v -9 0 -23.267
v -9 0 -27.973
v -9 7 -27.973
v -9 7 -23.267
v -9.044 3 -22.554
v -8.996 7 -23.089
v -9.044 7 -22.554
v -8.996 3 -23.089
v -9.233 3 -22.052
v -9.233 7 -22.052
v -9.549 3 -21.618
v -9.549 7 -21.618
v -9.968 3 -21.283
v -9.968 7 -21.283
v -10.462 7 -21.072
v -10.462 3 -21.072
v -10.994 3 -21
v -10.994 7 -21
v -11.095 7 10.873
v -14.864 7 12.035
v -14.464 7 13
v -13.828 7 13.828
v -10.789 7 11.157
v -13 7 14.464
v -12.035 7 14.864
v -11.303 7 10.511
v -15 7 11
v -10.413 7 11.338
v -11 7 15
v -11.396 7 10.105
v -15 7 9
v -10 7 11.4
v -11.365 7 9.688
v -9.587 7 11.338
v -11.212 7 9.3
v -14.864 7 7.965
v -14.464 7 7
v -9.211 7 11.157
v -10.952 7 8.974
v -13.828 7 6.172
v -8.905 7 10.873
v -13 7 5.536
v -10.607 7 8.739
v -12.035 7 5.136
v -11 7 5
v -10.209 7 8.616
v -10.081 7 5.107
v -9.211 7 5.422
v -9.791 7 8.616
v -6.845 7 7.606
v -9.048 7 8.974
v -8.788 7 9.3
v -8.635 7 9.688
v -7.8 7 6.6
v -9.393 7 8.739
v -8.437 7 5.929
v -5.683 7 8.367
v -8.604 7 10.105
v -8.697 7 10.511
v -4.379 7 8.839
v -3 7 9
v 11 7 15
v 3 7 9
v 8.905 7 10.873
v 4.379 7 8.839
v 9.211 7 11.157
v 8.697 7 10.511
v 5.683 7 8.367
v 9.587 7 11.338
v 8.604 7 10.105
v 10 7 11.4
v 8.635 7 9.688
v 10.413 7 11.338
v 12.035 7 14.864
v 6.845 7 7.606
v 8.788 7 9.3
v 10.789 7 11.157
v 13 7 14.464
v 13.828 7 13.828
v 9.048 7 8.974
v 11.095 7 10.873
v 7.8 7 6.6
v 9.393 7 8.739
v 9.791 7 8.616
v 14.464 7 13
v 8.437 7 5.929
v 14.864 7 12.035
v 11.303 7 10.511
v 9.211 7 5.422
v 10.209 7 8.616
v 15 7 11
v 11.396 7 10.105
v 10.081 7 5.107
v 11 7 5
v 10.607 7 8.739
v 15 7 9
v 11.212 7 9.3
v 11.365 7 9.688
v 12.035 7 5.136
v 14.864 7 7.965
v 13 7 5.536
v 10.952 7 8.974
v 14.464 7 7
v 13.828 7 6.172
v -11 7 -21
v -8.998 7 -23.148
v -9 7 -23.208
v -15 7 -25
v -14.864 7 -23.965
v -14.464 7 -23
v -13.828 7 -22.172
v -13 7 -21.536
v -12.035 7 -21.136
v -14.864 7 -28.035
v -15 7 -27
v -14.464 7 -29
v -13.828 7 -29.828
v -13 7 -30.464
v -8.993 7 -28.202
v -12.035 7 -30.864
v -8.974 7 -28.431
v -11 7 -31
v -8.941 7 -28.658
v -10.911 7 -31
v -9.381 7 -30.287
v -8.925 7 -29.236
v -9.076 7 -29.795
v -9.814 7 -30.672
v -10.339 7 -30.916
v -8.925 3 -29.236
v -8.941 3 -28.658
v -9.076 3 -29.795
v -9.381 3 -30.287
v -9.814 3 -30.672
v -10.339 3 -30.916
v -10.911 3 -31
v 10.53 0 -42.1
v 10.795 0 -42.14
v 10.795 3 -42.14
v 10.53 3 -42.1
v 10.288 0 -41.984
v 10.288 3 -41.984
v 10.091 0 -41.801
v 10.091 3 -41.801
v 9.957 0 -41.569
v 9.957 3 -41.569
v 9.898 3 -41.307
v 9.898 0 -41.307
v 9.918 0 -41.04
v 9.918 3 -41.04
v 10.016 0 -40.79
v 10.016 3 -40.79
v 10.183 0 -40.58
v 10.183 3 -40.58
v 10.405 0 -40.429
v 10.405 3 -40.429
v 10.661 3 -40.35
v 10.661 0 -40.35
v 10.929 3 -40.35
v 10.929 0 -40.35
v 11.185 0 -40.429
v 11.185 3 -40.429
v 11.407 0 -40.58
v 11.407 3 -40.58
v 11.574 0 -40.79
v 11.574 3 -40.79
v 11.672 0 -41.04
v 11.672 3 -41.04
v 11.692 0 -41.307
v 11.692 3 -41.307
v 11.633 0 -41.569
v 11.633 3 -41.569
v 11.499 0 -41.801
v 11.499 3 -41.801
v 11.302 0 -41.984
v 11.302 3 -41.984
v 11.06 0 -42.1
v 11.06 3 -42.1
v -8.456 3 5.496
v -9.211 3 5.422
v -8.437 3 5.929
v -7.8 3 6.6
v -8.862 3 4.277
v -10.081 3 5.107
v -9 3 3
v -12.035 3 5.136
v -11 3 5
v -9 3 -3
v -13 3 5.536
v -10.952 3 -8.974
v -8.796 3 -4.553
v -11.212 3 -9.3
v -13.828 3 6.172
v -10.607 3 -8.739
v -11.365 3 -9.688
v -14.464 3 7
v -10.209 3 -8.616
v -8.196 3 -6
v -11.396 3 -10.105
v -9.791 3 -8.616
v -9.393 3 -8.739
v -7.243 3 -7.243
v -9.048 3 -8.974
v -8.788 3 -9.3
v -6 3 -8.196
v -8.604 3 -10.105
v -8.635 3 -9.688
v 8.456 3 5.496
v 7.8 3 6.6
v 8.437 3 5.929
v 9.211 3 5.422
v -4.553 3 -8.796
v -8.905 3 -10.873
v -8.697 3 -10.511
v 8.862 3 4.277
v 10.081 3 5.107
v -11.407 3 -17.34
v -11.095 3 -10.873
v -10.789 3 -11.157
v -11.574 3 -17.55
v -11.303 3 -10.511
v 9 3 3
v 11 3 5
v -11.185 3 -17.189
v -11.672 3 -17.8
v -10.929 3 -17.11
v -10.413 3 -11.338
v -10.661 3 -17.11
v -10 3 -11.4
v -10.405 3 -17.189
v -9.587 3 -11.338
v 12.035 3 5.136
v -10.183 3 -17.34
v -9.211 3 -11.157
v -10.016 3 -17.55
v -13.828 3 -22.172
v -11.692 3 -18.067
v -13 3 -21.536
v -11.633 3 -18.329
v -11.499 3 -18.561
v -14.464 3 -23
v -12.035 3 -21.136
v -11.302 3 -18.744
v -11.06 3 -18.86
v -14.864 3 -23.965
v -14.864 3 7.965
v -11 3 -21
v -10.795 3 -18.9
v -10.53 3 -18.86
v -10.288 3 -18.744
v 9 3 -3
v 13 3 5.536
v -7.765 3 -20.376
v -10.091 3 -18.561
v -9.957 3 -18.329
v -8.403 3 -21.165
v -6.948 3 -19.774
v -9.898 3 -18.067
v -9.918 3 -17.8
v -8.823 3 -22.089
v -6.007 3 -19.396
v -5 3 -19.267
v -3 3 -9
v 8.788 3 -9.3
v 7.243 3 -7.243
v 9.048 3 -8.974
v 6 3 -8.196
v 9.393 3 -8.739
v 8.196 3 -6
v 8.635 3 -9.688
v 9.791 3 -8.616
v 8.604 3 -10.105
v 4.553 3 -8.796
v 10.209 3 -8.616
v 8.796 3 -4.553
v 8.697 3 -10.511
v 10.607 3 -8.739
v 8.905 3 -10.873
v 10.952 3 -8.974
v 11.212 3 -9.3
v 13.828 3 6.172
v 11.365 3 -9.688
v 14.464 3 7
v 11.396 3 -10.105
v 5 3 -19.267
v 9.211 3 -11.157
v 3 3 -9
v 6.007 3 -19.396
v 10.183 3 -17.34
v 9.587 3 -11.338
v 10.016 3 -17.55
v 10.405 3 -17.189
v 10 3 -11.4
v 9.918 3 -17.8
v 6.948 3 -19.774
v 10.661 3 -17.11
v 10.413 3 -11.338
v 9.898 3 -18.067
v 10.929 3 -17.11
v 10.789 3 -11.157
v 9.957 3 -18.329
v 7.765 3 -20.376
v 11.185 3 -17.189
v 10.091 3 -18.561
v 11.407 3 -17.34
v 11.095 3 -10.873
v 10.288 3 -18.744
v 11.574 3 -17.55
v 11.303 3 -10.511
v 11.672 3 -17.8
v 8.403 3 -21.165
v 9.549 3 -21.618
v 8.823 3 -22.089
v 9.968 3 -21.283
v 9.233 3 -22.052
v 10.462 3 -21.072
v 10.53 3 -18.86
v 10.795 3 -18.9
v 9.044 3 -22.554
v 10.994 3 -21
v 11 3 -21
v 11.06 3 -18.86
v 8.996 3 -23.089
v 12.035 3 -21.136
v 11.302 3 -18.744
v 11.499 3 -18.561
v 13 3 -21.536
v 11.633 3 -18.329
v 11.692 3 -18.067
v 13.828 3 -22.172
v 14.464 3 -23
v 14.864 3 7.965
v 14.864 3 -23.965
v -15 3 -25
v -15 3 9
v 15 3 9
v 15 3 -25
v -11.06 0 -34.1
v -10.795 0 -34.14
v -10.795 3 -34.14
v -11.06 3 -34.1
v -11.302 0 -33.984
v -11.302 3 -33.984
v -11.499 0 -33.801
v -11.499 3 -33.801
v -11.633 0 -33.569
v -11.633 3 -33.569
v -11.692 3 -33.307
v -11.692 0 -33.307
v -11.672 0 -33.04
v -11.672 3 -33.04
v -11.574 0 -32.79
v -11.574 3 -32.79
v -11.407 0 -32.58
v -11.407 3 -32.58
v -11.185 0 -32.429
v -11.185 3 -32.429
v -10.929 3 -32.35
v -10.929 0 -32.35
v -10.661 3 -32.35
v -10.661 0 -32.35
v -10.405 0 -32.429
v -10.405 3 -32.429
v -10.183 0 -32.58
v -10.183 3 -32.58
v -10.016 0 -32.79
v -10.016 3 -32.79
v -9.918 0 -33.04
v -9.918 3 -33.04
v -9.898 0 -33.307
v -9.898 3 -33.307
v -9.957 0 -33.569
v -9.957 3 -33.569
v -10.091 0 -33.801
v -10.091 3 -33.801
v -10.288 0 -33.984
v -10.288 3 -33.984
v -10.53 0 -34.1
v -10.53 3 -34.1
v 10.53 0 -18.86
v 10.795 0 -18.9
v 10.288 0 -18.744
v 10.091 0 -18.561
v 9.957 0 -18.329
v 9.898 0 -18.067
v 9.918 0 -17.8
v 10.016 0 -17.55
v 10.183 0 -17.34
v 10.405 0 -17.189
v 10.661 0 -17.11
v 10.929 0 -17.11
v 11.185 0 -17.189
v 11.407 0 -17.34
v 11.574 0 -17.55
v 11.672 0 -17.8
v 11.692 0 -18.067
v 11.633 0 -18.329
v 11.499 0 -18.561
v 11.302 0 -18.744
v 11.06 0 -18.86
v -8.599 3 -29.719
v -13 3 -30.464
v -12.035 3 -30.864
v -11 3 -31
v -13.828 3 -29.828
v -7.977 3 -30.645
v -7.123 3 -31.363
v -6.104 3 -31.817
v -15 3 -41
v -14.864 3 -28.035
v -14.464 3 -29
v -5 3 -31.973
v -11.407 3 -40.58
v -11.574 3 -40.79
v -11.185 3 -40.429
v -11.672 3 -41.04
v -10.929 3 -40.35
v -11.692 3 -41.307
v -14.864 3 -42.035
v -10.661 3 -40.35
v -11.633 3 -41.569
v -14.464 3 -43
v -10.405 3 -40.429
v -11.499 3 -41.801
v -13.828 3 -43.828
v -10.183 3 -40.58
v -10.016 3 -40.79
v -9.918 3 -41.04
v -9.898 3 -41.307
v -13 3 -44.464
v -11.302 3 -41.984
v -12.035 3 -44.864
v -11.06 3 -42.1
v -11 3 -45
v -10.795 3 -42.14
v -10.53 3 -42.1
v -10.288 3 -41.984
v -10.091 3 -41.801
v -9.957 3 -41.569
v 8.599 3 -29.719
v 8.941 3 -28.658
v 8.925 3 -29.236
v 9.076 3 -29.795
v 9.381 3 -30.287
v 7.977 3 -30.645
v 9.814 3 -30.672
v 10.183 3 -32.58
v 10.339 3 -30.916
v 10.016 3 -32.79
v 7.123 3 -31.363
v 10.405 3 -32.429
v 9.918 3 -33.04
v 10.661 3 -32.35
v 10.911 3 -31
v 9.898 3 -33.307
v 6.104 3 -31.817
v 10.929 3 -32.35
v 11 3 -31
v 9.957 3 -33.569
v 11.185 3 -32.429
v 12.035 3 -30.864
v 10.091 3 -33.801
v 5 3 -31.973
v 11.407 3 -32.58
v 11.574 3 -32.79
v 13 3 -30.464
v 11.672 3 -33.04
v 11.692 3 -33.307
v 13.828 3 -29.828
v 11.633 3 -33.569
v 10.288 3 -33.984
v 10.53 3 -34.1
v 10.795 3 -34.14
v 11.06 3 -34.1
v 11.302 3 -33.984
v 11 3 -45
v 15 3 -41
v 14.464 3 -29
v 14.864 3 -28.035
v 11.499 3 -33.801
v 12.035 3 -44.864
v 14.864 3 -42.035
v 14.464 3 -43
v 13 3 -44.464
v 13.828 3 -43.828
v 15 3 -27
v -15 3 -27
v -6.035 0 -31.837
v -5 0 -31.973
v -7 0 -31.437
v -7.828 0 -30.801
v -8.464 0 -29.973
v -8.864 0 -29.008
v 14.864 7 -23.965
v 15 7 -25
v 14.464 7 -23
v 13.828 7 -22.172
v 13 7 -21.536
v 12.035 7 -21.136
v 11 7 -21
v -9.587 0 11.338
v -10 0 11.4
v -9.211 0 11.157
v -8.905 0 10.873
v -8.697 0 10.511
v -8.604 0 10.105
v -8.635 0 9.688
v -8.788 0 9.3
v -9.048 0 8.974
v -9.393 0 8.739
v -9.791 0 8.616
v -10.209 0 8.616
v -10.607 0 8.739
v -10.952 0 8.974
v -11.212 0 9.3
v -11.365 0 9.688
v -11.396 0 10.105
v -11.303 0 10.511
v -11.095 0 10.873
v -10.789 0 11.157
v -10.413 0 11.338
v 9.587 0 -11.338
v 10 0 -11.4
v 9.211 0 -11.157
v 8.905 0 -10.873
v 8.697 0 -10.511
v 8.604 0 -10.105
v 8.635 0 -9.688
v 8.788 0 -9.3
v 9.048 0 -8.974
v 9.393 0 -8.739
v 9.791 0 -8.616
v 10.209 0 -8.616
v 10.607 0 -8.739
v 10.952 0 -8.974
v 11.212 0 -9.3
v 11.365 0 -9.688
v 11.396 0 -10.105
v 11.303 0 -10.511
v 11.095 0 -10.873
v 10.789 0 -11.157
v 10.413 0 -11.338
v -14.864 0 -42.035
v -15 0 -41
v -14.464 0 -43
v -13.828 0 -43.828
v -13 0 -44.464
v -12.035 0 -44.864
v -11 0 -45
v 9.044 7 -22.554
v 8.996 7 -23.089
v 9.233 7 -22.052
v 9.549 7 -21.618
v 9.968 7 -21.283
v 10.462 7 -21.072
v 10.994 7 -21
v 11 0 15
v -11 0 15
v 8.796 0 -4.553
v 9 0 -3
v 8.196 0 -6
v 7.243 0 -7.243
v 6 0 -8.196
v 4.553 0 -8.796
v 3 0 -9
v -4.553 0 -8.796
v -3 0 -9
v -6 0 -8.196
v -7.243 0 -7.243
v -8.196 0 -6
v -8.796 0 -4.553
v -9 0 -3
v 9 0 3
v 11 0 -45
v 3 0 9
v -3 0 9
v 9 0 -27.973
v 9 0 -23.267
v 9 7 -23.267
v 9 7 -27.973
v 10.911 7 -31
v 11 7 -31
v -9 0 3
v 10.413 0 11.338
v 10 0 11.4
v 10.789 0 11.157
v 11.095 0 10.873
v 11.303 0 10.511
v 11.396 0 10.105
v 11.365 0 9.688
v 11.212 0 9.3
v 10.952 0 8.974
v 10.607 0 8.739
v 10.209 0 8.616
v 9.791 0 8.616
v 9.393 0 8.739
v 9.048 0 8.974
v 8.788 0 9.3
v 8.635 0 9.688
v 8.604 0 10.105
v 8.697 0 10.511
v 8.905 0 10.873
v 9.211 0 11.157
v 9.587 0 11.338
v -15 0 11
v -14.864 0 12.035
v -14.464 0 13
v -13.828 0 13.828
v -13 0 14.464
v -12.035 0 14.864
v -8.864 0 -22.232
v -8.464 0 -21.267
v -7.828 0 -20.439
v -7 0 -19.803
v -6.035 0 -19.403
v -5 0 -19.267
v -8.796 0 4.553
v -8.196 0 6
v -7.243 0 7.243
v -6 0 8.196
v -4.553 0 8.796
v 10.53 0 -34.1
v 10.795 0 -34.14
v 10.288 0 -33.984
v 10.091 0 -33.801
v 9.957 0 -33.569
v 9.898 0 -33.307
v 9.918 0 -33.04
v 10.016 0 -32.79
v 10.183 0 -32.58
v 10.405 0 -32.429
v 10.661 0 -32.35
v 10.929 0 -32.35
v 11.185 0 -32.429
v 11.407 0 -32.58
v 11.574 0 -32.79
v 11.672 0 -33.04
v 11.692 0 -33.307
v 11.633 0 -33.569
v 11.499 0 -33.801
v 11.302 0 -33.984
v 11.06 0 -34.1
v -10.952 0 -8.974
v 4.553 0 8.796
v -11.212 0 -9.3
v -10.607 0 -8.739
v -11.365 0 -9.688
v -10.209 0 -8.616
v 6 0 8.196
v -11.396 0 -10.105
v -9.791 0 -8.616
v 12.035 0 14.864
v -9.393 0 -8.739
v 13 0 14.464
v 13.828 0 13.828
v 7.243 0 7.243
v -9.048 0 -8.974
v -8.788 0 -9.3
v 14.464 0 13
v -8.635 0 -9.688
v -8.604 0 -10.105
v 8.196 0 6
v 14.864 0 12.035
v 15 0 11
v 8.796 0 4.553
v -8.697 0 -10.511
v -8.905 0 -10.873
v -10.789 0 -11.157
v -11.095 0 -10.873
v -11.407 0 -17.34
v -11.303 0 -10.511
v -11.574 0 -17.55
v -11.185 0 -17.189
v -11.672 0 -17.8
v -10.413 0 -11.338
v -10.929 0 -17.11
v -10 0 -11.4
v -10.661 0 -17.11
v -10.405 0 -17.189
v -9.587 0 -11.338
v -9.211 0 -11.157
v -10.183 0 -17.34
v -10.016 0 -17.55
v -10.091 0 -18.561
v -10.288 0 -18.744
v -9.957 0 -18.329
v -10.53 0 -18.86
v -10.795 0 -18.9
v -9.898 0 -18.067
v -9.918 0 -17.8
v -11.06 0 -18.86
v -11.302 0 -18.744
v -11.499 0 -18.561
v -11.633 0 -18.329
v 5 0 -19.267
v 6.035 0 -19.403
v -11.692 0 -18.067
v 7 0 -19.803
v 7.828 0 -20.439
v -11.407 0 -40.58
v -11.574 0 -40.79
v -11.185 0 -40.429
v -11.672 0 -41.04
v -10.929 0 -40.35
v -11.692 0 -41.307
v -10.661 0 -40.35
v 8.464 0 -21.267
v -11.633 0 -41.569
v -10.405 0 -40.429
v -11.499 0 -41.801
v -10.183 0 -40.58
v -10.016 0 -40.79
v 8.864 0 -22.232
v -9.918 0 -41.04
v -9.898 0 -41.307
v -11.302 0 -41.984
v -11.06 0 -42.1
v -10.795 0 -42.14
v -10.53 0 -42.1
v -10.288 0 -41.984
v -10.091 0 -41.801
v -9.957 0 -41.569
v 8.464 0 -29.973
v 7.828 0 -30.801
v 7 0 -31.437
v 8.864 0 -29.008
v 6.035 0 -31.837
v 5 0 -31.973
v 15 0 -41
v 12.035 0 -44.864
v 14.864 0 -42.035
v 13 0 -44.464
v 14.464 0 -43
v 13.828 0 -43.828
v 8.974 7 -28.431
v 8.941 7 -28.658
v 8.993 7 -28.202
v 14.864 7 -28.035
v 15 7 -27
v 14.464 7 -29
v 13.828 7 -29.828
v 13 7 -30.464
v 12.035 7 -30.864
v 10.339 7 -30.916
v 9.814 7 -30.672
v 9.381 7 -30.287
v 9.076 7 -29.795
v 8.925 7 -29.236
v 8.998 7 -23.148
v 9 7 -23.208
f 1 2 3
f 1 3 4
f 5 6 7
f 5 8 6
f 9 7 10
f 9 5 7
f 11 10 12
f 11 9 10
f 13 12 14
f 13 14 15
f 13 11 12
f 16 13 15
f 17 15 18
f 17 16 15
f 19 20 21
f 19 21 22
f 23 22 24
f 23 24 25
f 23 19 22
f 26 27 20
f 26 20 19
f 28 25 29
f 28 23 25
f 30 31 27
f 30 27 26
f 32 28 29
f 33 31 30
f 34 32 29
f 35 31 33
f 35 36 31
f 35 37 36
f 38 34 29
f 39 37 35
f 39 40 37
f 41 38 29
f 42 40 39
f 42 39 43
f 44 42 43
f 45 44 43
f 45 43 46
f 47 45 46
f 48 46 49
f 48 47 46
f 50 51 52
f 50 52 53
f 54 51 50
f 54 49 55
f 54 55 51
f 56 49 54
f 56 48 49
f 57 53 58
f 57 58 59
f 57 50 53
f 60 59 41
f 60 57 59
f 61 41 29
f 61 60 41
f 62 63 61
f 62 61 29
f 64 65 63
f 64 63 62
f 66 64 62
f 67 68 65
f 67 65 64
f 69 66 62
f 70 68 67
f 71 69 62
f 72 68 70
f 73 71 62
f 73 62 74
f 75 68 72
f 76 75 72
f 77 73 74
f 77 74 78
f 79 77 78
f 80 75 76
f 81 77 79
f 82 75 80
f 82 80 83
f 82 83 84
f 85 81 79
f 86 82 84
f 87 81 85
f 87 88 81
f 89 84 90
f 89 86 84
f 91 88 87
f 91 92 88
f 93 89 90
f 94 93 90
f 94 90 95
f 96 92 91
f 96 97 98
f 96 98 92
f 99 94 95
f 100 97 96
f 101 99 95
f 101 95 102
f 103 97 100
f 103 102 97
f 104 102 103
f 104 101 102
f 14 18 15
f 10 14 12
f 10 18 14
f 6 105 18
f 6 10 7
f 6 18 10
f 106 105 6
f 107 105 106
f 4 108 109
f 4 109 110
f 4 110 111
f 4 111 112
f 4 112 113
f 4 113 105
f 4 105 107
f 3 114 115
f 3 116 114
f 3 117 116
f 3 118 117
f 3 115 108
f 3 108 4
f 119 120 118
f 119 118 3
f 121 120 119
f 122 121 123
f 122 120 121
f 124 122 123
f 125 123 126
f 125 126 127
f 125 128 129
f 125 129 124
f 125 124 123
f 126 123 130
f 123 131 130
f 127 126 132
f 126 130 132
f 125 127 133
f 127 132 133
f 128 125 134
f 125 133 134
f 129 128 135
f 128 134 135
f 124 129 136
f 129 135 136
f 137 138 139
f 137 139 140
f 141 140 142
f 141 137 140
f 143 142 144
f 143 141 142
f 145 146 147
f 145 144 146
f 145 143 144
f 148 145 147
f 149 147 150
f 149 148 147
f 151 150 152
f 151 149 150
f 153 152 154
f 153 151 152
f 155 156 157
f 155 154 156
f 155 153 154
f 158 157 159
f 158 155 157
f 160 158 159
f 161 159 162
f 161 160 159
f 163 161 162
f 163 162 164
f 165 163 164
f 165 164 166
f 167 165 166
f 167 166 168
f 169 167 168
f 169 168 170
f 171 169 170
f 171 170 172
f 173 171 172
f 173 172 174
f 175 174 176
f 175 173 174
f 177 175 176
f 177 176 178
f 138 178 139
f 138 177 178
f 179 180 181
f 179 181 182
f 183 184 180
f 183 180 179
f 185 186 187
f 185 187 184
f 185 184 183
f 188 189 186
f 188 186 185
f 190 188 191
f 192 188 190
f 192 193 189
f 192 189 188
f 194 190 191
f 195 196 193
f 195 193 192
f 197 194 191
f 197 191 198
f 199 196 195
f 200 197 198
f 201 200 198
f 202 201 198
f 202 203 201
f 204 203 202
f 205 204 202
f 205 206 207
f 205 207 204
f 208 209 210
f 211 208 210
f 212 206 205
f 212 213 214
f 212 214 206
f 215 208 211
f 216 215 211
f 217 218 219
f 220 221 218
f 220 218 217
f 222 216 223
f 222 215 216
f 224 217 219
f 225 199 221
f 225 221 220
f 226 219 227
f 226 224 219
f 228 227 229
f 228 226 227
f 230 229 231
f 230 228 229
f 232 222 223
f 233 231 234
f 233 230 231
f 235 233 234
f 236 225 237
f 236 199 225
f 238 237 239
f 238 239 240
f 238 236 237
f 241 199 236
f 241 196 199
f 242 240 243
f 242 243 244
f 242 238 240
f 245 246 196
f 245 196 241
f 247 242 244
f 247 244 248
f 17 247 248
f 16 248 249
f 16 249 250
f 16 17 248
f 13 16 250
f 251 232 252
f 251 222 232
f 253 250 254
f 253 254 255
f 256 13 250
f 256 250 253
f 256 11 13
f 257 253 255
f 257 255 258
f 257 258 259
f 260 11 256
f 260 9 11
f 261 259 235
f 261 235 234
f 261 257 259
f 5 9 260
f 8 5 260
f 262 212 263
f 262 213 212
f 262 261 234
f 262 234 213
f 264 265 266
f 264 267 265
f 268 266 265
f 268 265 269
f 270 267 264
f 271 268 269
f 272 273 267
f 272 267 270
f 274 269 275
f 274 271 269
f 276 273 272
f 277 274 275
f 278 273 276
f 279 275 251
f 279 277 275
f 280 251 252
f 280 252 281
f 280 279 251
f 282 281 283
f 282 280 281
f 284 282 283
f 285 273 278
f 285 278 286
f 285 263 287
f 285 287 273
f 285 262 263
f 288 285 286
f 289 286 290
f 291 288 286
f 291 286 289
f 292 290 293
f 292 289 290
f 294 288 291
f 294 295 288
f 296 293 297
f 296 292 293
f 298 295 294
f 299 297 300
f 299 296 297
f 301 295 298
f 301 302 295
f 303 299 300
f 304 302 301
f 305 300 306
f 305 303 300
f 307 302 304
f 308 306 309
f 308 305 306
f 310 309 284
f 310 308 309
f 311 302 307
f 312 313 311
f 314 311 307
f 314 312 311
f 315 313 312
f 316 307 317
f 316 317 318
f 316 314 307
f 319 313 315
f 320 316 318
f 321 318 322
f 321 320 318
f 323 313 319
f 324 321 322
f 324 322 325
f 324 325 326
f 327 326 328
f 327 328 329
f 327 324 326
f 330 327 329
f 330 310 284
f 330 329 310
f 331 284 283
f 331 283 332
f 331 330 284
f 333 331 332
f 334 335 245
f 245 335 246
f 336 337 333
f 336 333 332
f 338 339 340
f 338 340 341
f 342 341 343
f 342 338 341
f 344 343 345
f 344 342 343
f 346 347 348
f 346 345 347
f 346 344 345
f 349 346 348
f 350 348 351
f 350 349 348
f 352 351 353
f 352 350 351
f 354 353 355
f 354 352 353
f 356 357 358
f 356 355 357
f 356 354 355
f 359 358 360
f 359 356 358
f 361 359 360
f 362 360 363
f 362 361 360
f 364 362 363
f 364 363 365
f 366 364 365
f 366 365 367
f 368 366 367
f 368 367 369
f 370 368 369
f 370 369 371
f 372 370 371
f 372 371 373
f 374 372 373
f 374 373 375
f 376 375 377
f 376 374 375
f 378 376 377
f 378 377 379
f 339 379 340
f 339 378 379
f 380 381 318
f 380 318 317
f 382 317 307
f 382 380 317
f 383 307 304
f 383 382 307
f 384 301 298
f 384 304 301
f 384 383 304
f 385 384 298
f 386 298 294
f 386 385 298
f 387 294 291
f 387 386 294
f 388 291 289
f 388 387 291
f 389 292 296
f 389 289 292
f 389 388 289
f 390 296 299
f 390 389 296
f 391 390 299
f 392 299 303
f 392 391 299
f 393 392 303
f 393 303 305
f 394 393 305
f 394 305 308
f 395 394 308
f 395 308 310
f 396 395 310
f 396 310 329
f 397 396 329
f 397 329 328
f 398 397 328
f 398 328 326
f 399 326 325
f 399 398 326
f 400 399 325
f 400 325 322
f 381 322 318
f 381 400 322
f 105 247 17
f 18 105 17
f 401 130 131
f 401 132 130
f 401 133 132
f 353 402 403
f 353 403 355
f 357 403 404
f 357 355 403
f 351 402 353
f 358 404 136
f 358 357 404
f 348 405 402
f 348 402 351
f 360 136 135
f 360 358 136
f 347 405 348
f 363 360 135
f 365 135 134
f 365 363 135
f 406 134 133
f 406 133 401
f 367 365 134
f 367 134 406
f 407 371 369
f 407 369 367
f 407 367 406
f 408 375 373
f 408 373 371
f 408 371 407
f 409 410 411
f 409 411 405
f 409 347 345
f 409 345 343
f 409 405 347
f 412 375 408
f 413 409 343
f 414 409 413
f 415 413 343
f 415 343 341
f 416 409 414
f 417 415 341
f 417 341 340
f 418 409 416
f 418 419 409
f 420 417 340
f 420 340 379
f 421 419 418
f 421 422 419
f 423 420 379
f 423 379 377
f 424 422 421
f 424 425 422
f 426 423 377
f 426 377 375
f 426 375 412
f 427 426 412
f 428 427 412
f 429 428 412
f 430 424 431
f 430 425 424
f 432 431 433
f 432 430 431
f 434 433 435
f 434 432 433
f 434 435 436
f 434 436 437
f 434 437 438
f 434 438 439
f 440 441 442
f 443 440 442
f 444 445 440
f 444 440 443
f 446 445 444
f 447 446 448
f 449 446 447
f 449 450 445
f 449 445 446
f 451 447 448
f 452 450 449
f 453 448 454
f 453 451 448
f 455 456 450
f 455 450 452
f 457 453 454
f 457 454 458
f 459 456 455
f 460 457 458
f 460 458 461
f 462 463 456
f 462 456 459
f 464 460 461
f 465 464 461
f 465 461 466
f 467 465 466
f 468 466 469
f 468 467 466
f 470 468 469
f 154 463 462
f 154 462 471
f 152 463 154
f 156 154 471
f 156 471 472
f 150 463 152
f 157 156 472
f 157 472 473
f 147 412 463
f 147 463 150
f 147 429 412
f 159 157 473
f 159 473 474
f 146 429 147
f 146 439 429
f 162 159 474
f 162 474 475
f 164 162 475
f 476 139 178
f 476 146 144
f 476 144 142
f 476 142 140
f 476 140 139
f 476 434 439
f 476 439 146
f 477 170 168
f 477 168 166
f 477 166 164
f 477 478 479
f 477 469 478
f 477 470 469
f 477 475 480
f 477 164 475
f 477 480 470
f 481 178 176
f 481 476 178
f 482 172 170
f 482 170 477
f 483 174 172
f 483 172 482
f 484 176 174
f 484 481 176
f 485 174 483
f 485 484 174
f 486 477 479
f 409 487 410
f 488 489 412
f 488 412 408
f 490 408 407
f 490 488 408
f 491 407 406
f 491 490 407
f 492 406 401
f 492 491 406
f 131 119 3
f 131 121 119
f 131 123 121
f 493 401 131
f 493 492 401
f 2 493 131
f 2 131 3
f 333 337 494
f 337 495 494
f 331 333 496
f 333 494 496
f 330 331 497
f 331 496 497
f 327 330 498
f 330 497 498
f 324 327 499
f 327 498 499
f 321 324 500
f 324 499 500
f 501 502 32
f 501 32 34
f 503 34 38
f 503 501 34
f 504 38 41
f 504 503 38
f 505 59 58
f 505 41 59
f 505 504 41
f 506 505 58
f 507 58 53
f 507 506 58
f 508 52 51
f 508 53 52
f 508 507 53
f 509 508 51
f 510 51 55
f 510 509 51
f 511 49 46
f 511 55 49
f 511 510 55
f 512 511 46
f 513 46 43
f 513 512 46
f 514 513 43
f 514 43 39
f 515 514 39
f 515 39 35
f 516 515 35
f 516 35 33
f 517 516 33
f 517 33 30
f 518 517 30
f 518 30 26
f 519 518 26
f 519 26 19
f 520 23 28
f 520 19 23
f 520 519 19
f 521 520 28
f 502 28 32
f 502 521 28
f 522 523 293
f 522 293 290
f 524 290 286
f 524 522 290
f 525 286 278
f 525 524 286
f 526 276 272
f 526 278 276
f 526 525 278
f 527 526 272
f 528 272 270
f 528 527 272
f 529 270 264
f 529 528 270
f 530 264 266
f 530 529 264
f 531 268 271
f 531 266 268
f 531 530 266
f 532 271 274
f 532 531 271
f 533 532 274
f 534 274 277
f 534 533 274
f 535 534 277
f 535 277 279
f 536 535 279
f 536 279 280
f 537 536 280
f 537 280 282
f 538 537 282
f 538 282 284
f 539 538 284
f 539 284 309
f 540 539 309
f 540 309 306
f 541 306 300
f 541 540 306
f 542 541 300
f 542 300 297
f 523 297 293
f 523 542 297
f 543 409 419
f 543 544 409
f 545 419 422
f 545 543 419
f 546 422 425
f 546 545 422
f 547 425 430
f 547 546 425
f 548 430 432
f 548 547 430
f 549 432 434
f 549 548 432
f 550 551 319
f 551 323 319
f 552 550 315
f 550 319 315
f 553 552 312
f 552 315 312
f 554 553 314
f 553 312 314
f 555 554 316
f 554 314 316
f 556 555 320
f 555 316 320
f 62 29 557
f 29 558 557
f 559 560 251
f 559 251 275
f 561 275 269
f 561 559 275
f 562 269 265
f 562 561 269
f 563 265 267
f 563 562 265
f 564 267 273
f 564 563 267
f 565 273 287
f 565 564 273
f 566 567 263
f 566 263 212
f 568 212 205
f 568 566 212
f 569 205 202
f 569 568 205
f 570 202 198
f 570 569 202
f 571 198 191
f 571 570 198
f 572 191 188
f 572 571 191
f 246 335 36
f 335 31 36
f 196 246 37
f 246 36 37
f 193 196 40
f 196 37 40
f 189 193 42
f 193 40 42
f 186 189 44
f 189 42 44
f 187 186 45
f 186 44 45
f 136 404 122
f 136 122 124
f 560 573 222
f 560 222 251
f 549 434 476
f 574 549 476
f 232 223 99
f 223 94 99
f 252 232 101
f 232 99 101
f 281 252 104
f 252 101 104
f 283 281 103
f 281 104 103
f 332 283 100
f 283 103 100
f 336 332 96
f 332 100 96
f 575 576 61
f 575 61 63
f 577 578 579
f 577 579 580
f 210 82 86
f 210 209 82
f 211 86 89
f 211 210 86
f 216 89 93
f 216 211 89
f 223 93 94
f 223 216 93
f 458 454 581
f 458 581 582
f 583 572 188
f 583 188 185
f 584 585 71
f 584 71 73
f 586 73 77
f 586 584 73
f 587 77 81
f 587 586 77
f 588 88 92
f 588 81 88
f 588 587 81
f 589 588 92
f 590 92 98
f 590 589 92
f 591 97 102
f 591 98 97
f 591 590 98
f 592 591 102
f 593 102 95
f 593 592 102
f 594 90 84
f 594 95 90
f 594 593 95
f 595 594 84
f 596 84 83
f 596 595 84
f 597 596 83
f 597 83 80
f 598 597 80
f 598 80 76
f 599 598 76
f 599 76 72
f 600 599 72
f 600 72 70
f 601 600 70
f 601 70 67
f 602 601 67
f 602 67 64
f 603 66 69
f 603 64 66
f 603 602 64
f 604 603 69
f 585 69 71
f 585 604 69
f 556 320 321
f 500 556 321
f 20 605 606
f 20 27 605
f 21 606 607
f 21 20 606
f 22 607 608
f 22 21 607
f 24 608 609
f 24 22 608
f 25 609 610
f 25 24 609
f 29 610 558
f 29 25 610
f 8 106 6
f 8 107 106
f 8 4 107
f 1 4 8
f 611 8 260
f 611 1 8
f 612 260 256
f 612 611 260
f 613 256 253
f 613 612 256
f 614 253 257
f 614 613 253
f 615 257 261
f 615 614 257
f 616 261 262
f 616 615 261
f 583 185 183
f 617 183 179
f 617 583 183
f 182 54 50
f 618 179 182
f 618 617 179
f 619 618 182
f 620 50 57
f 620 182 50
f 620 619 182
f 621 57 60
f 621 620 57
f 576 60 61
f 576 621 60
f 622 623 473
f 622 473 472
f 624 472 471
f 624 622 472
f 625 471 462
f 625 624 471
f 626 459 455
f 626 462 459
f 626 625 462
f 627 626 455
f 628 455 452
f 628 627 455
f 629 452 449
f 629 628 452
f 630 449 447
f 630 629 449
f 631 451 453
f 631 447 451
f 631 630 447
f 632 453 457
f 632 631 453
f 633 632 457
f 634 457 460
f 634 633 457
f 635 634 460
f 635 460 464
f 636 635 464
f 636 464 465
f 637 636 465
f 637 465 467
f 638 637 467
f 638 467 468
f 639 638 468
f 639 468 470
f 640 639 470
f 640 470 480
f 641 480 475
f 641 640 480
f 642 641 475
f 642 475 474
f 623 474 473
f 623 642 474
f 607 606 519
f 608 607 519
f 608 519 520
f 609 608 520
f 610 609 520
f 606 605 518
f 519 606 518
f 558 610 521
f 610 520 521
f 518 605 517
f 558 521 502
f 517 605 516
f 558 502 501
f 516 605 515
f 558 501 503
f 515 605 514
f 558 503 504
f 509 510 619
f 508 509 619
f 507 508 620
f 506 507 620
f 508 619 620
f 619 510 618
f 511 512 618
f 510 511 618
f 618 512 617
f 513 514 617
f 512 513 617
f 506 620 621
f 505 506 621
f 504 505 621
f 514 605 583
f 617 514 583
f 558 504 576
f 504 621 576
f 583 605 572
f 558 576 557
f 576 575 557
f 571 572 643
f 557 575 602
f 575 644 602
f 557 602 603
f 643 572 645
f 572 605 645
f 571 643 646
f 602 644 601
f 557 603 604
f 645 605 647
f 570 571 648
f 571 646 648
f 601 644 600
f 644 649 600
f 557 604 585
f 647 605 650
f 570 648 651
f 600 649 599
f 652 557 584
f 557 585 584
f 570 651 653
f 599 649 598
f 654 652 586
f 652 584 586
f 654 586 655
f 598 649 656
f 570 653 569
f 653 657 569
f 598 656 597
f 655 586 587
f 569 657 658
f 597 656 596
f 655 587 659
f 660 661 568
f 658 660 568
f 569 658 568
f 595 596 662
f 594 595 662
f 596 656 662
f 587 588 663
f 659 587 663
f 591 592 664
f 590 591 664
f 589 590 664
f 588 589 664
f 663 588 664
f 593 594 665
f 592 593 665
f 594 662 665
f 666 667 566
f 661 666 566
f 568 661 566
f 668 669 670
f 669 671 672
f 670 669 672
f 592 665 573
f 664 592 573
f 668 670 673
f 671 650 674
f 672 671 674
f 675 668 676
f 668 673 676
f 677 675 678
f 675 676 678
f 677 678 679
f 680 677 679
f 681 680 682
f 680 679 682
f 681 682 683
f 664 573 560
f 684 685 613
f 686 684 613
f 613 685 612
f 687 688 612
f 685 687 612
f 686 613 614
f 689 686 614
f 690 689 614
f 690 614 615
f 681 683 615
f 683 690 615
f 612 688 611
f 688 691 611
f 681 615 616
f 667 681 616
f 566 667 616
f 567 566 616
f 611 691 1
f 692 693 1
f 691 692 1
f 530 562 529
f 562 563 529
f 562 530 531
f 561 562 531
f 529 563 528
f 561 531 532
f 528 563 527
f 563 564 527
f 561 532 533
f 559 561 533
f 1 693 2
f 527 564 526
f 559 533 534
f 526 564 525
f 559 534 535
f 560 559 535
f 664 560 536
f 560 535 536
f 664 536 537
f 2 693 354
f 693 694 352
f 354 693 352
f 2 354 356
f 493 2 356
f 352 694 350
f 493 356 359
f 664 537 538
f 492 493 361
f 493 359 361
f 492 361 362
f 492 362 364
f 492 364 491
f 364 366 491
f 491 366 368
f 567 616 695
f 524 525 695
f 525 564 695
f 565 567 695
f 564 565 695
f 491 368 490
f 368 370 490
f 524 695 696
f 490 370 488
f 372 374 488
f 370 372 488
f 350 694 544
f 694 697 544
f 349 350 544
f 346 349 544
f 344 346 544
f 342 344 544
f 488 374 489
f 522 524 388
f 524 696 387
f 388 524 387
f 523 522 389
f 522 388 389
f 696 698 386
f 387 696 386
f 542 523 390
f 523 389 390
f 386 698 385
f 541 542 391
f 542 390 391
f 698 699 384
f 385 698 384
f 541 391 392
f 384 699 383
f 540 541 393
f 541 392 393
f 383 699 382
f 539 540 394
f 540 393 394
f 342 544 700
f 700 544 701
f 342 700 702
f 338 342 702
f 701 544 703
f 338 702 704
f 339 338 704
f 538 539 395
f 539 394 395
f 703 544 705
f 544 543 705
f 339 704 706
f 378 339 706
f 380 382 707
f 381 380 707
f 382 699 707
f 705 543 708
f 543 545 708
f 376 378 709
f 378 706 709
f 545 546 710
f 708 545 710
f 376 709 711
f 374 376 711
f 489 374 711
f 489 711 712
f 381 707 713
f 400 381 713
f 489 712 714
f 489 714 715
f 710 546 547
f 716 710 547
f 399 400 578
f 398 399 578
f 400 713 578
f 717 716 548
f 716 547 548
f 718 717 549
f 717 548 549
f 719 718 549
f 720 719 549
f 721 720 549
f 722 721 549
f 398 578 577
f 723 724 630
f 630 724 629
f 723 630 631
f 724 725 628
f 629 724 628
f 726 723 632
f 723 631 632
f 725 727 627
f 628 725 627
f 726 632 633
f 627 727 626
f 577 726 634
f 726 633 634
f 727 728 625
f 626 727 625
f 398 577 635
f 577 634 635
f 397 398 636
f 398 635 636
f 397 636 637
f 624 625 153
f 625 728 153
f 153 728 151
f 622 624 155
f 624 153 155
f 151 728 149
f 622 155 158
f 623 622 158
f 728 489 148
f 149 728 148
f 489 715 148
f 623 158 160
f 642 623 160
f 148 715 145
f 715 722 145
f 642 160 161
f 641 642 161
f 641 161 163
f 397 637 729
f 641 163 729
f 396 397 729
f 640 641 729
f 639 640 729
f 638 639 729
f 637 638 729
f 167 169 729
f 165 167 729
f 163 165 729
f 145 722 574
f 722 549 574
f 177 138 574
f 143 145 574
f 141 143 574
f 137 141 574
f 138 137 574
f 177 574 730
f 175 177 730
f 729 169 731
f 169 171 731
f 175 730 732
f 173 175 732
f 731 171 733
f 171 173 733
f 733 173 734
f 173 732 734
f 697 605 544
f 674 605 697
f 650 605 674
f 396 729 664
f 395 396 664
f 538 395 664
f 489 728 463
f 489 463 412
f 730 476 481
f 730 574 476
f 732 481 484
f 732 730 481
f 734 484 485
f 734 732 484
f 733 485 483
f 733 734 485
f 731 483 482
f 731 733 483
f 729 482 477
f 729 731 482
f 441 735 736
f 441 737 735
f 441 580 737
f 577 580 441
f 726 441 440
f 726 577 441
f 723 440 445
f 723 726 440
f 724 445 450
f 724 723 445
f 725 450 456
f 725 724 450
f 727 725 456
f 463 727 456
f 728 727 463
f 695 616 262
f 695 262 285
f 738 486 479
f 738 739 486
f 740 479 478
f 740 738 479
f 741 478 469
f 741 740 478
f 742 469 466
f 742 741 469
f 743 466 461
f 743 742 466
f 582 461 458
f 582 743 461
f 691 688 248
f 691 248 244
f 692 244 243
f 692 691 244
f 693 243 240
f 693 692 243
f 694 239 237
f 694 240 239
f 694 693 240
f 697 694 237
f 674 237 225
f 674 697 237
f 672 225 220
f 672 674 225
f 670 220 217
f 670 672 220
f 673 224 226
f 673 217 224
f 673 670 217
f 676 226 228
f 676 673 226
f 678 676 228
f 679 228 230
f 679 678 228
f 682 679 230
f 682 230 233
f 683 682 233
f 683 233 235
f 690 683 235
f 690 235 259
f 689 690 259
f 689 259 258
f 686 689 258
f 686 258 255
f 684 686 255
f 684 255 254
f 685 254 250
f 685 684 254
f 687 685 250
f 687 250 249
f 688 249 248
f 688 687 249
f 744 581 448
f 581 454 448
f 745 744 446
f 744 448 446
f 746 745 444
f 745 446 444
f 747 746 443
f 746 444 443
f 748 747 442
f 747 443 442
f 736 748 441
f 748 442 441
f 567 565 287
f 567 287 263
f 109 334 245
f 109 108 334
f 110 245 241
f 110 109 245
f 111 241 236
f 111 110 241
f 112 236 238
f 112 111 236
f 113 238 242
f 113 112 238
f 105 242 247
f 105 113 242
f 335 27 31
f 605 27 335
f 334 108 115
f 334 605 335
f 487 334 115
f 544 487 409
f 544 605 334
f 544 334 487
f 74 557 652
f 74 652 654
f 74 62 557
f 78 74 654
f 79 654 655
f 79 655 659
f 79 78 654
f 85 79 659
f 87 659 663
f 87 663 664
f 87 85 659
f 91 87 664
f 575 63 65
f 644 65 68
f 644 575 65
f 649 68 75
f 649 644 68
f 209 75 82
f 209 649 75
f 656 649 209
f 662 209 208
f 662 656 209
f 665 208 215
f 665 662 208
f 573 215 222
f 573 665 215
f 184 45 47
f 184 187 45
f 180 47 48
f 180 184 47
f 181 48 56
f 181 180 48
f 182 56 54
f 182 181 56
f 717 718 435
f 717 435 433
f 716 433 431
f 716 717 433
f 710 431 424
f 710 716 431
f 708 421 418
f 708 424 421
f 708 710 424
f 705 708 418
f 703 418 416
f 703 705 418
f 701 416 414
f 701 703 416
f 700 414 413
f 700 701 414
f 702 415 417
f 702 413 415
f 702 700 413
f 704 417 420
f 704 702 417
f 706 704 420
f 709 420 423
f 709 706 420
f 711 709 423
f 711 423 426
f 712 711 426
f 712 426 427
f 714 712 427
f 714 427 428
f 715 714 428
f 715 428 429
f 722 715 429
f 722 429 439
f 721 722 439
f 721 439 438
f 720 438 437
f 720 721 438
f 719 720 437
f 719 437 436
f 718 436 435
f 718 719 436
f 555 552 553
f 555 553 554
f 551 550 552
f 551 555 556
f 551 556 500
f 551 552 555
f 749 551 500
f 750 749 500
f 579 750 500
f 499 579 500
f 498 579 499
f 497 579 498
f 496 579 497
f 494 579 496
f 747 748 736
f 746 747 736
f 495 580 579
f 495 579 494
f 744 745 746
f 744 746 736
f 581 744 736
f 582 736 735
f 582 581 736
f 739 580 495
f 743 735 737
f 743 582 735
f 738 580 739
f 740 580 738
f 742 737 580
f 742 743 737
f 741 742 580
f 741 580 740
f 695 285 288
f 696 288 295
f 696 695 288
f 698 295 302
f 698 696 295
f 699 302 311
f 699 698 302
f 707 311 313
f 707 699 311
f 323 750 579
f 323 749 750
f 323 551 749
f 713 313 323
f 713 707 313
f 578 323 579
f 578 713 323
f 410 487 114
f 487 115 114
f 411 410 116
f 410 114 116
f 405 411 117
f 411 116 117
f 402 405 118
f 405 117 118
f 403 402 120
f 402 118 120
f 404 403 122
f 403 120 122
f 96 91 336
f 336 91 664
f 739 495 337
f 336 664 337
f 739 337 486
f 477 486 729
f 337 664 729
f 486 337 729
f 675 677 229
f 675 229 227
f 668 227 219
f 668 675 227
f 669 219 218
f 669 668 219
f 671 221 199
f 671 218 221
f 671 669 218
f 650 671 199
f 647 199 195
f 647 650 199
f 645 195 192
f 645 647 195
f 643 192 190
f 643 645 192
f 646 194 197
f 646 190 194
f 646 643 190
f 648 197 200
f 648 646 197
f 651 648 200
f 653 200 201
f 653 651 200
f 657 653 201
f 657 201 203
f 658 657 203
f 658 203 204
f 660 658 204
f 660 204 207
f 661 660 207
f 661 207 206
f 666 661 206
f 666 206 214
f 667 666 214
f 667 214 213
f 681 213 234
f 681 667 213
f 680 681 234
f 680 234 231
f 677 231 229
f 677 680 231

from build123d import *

# Parameters (mm, degrees)
SKETCH1_W               = 30
SKETCH1_H               = 30
BOSS_EXTRUDE1_DEPTH     = 3
SKETCH3_W               = 30
SKETCH3_H               = 30
BOSS_EXTRUDE2_DEPTH     = 3
SKETCH4_W               = 30
SKETCH4_H               = 10
BOSS_EXTRUDE3_DEPTH     = 4
CUT_EXTRUDE1_DEPTH      = 48.602520942
CUT_EXTRUDE1_DEPTH_BACK = 48.602520942
SKETCH2_R               = 1.4
SKETCH2_R_2             = 0.9
FILLET1_R               = 4
FILLET2_R               = 2


with BuildPart() as part:
    # Sketch1 → Boss-Extrude1 (new body)
    with BuildSketch(Plane(origin=(0, 0, 0), x_dir=(1, 0, 0), z_dir=(0, 1, 0))):
        Rectangle(SKETCH1_W, SKETCH1_H)
    extrude(amount=BOSS_EXTRUDE1_DEPTH)

    # Sketch3 → Boss-Extrude2 (add)
    with BuildSketch(Plane(origin=(0, 3, 0), x_dir=(1, 0, 0), z_dir=(0, 1, 0))):
        with Locations((0, 30)):
            Rectangle(SKETCH3_W, SKETCH3_H)
    extrude(amount=-BOSS_EXTRUDE2_DEPTH)

    # Sketch4 → Boss-Extrude3 (add)
    with BuildSketch(Plane(origin=(0, 3, 0), x_dir=(1, 0, 0), z_dir=(0, 1, 0))):
        with Locations((0, -10)):
            Rectangle(SKETCH4_W, SKETCH4_H)
        with Locations((0, 26)):
            Rectangle(SKETCH4_W, SKETCH4_H)
    extrude(amount=BOSS_EXTRUDE3_DEPTH)

    # Sketch2 → Cut-Extrude1 (cut, two sides: drawn at the far end of the back side and taken through both)
    with BuildSketch(Plane(origin=(0, 3, 0), x_dir=(1, 0, 0), z_dir=(0, 1, 0)).offset(-CUT_EXTRUDE1_DEPTH_BACK)):
        with Locations(Location((-10, -10, 0), (0, 0, 270))):
            Circle(SKETCH2_R)
        with Locations(Location((10, -10, 0), (0, 0, 270))):
            Circle(SKETCH2_R)
        with Locations(Location((10, 10, 0), (0, 0, 90))):
            Circle(SKETCH2_R)
        with Locations(Location((-10, 10, 0), (0, 0, 90))):
            Circle(SKETCH2_R)
        with Locations(Location((-10.795, 33.24, 0), (0, 0, 90))):
            Circle(SKETCH2_R_2)
        with Locations(Location((10.795, 33.24, 0), (0, 0, 90))):
            Circle(SKETCH2_R_2)
        with Locations(Location((10.795, 18, 0), (0, 0, 90))):
            Circle(SKETCH2_R_2)
        with Locations(Location((-10.795, 18, 0), (0, 0, 90))):
            Circle(SKETCH2_R_2)
        with Locations(Location((-10.795, 41.24, 0), (0, 0, 90))):
            Circle(SKETCH2_R_2)
        with Locations(Location((10.795, 41.24, 0), (0, 0, 90))):
            Circle(SKETCH2_R_2)
        with BuildLine():
            Line((-3, -9), (3, -9))
            ThreePointArc((3, -9), (7.242640687, -7.242640687), (9, -3))
            Line((9, -3), (9, 3))
            ThreePointArc((9, 3), (7.242640687, 7.242640687), (3, 9))
            Line((3, 9), (-3, 9))
            ThreePointArc((-3, 9), (-7.242640687, 7.242640687), (-9, 3))
            Line((-9, 3), (-9, -3))
            ThreePointArc((-9, -3), (-7.242640687, -7.242640687), (-3, -9))
        make_face()
        with BuildLine():
            Line((-5, 19.267058824), (5, 19.267058824))
            ThreePointArc((5, 19.267058824), (7.828427125, 20.438631699), (9, 23.267058824))
            Line((9, 23.267058824), (9, 27.972941176))
            ThreePointArc((9, 27.972941176), (7.828427125, 30.801368301), (5, 31.972941176))
            Line((5, 31.972941176), (-5, 31.972941176))
            ThreePointArc((-5, 31.972941176), (-7.828427125, 30.801368301), (-9, 27.972941176))
            Line((-9, 27.972941176), (-9, 23.267058824))
            ThreePointArc((-9, 23.267058824), (-7.828427125, 20.438631699), (-5, 19.267058824))
        make_face()
    extrude(amount=CUT_EXTRUDE1_DEPTH + CUT_EXTRUDE1_DEPTH_BACK, mode=Mode.SUBTRACT)

    # Fillet1
    fillet1_edges = [part.edges().sort_by_distance(p)[0] for p in [
        (-15, 1.5, -45),
        (15, 1.5, -45),
        (15, 3.5, 15),
        (-15, 3.5, 15),
        (15, 5, 5),
        (8.656854249, 5, 5),
        (-8.656854249, 5, 5),
        (-15, 5, 5),
        (15, 5, -21),
        (15, 5, -31),
        (-15, 5, -21),
        (-15, 5, -31),
    ]]
    fillet(fillet1_edges, radius=FILLET1_R - 0.0001)  # a hair under: the kernel refuses the full size

    # Fillet2
    fillet2_edges = [part.edges().sort_by_distance(p)[0] for p in [
        (-8.29551882, 5, -21),
        (8.29551882, 5, -21),
        (7.614749487, 5, -31),
        (-7.614749487, 5, -31),
    ]]
    fillet(fillet2_edges, radius=FILLET2_R)


solid = part.part
